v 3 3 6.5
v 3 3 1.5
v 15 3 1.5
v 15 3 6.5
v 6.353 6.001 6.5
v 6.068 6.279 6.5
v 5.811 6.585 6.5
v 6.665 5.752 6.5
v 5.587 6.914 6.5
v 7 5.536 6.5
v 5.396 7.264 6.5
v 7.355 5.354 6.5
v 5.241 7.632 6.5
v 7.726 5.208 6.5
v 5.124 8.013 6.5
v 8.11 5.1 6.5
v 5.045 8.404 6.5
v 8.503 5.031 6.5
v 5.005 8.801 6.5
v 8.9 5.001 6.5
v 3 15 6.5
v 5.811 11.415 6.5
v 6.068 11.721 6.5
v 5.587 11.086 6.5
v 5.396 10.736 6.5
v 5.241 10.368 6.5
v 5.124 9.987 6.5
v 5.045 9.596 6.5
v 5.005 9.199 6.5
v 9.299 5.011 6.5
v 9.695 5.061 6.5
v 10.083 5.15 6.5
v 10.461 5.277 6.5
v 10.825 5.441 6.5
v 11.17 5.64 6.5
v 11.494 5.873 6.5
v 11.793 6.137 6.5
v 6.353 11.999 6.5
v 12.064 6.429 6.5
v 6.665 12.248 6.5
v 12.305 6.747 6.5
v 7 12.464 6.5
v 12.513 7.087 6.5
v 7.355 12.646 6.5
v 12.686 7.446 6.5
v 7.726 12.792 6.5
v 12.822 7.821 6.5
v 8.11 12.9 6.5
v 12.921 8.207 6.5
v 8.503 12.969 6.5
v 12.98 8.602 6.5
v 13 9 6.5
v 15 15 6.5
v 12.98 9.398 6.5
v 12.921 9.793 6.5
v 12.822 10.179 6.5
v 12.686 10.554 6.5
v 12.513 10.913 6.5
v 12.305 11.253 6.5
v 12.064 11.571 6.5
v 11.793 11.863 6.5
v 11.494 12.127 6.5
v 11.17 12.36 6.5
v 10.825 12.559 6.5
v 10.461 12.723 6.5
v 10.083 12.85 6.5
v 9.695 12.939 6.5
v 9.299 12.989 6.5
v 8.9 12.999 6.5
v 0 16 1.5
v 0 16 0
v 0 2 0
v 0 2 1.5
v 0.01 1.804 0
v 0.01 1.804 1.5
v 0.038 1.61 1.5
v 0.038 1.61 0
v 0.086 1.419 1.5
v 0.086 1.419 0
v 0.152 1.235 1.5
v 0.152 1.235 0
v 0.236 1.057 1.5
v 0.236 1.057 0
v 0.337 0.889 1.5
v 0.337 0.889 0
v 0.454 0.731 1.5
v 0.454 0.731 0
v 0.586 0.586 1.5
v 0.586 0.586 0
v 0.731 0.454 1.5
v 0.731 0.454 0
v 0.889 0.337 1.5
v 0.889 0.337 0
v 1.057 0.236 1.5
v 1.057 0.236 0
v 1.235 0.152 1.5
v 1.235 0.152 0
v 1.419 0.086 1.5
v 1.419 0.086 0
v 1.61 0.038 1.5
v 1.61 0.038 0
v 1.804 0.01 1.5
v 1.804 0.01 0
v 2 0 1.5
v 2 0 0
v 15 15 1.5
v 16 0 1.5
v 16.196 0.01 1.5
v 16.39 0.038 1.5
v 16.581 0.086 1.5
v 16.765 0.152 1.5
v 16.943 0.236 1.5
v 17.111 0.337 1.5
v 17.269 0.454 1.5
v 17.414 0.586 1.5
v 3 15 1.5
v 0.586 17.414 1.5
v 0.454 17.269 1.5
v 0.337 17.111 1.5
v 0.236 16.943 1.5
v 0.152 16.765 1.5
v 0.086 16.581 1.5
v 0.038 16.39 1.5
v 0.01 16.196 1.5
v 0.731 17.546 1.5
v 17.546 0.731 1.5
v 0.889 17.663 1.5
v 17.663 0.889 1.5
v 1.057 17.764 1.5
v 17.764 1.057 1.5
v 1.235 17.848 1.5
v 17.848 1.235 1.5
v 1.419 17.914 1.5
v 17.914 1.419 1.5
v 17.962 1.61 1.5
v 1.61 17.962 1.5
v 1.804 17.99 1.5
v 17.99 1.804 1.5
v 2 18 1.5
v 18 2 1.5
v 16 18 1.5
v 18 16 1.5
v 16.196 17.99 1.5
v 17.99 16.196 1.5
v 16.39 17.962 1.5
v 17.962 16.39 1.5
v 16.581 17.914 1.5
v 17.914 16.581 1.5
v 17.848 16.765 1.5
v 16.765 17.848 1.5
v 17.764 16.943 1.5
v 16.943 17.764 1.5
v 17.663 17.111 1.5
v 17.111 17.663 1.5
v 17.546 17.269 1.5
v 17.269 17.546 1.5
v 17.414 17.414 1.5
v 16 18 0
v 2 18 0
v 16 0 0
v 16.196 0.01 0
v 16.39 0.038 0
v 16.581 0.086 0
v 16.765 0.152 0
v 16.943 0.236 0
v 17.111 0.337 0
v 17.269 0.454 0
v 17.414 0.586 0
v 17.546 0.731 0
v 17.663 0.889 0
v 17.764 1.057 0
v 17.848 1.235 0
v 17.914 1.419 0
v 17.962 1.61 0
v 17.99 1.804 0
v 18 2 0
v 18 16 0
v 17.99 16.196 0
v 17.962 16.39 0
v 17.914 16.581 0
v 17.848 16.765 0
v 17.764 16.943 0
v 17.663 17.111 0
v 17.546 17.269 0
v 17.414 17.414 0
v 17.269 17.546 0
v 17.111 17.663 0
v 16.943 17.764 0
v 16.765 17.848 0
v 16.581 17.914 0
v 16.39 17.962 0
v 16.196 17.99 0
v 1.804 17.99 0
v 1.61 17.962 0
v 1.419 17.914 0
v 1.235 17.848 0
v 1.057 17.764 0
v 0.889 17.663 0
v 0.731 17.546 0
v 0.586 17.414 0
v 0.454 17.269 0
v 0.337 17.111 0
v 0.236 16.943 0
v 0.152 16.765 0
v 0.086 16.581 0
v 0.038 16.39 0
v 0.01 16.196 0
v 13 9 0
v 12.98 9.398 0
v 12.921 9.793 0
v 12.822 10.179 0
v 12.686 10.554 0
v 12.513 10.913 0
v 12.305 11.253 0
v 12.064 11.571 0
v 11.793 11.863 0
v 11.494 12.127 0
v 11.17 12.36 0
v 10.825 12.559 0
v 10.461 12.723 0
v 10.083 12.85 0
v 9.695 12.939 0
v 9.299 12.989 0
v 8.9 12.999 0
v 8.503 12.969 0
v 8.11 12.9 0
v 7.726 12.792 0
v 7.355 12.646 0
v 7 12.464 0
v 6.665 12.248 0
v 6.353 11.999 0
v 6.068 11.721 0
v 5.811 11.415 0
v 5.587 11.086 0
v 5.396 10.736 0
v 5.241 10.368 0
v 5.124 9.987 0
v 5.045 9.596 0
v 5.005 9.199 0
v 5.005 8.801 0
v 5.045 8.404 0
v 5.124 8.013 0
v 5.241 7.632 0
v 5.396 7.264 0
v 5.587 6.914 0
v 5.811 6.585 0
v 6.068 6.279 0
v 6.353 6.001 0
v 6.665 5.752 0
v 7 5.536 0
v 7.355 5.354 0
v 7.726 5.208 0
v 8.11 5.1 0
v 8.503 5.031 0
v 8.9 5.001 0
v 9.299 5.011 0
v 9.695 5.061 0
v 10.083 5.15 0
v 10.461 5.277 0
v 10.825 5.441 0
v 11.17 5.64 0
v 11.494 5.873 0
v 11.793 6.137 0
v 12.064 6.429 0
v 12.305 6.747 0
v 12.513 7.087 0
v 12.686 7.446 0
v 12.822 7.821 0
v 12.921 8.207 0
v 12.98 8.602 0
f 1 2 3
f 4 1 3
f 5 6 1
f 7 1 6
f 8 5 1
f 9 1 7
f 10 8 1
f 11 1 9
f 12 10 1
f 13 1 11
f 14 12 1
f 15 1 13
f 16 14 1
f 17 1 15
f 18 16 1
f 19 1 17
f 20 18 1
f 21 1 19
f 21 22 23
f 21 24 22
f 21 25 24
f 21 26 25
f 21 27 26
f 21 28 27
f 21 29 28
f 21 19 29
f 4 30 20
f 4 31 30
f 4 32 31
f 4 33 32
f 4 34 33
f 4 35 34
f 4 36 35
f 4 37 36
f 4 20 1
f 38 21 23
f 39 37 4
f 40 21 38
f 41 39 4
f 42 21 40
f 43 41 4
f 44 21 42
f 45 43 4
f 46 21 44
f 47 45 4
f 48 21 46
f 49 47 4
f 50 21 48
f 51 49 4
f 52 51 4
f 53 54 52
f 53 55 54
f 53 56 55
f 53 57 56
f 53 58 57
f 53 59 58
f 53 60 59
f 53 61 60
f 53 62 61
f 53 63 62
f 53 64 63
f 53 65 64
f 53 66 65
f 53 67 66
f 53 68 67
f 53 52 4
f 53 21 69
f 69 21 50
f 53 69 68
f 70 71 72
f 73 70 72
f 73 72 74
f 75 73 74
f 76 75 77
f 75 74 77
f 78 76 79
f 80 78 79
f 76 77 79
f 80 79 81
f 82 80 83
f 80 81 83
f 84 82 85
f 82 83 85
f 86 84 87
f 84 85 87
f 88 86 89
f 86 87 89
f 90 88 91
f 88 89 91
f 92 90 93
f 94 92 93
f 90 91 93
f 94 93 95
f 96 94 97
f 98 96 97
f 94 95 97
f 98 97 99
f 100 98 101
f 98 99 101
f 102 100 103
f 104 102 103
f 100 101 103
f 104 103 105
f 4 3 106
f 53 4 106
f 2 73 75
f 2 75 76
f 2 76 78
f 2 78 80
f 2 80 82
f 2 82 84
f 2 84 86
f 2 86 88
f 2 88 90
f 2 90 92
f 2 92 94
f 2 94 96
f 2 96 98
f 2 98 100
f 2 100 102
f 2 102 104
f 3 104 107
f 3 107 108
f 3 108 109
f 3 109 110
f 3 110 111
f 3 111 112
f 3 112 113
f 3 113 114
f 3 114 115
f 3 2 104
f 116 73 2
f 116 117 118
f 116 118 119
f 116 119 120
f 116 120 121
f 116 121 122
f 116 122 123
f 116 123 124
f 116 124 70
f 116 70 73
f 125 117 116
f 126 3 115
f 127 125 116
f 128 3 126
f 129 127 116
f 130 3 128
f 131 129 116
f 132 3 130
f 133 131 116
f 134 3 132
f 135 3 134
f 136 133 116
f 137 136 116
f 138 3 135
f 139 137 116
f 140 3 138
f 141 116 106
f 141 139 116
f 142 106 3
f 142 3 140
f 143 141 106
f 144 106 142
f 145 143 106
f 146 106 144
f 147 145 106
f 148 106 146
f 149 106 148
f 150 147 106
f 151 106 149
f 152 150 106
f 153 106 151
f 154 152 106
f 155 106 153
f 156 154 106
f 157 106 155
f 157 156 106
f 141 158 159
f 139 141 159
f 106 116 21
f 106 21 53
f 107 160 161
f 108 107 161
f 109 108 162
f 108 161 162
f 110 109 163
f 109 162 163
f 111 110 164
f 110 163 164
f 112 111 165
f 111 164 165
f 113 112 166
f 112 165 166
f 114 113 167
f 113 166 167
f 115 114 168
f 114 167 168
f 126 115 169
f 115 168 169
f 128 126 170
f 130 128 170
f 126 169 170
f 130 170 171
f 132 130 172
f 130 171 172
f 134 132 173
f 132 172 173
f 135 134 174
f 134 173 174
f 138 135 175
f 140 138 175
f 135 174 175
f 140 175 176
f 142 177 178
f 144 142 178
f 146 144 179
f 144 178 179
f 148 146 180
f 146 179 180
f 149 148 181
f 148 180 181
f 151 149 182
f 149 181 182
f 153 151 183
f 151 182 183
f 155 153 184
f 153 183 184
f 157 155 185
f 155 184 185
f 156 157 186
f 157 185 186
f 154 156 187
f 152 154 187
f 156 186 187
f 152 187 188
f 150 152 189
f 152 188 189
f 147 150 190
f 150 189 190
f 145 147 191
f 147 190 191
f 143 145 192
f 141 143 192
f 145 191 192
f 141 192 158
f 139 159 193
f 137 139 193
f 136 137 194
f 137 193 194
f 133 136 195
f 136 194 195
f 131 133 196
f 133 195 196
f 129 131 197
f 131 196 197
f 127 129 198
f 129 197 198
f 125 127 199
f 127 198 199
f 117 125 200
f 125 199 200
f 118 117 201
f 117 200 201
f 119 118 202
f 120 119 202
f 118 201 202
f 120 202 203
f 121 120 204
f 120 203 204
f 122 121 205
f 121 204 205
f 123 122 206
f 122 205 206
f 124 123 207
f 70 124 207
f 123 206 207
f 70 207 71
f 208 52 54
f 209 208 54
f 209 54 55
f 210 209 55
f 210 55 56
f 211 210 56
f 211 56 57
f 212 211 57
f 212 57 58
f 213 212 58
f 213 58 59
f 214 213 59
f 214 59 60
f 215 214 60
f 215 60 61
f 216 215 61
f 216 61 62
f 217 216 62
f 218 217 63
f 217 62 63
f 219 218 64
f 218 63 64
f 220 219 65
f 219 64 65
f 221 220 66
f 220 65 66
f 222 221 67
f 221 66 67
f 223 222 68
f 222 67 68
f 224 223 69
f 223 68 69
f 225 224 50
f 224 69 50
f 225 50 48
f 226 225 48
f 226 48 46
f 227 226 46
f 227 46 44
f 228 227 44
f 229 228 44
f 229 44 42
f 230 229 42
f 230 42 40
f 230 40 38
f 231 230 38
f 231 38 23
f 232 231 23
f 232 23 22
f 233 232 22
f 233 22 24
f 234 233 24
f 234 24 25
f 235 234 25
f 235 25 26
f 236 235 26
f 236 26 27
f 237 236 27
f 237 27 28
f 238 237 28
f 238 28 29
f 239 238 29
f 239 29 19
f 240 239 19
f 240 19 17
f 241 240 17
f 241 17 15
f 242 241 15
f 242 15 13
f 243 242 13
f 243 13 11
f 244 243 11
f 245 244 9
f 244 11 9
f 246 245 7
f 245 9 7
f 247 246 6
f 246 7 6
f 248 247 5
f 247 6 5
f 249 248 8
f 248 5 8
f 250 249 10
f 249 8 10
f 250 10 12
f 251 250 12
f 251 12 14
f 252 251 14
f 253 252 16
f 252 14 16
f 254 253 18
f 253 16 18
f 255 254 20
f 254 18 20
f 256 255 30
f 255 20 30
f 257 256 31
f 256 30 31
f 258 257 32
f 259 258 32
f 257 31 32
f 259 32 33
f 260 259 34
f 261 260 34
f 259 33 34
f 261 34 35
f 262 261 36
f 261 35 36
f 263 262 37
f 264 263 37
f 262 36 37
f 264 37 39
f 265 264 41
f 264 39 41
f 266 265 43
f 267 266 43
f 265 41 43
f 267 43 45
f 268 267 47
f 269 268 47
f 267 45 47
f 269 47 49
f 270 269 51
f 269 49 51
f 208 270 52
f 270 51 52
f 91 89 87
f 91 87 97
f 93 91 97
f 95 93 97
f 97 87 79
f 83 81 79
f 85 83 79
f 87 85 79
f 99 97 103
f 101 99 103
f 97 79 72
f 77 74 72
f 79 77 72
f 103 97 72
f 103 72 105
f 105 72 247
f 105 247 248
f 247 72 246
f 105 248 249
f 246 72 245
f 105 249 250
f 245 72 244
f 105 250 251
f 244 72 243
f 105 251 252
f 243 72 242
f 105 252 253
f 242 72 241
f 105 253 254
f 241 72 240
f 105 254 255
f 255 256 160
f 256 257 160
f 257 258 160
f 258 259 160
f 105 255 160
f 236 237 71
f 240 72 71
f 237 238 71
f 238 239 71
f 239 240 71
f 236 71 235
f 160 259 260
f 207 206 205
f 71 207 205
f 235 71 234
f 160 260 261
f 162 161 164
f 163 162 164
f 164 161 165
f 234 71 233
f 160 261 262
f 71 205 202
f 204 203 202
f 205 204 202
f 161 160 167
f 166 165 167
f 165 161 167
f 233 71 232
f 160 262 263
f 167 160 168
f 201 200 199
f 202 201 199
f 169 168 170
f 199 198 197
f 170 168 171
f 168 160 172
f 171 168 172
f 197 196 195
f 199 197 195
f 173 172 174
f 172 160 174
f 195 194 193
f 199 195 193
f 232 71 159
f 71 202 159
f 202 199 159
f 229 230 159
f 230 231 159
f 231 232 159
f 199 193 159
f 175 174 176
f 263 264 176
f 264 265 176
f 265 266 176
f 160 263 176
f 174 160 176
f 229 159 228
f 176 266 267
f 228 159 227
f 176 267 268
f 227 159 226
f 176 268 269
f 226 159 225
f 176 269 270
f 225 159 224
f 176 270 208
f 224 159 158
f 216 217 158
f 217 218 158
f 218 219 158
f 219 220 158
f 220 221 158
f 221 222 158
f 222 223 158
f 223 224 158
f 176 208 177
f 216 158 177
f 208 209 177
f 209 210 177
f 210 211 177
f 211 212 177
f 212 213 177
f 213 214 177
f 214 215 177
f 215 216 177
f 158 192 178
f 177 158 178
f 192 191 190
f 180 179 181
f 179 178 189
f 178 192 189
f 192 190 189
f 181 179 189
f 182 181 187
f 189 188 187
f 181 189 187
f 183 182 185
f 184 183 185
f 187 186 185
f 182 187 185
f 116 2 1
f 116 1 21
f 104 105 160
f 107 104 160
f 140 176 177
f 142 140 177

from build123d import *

# Parameters (mm, degrees)
BOSS_EXTRUDE1_DEPTH = 1.5
SKETCH2_W           = 12
SKETCH2_H           = 12
BOSS_EXTRUDE2_DEPTH = 5
SKETCH3_R           = 4
CUT_EXTRUDE1_DEPTH  = 7.5


with BuildPart() as part:
    # Sketch1 → Boss-Extrude1 (new body)
    with BuildSketch(Plane.XY):
        with BuildLine():
            Line((2, 0), (16, 0))
            ThreePointArc((16, 0), (17.414213562, 0.585786438), (18, 2))
            Line((18, 2), (18, 16))
            ThreePointArc((18, 16), (17.414213562, 17.414213562), (16, 18))
            Line((16, 18), (2, 18))
            ThreePointArc((2, 18), (0.585786438, 17.414213562), (0, 16))
            Line((0, 16), (0, 2))
            ThreePointArc((0, 2), (0.585786438, 0.585786438), (2, 0))
        make_face()
    extrude(amount=BOSS_EXTRUDE1_DEPTH)

    # Sketch2 → Boss-Extrude2 (add)
    with BuildSketch(Plane.XY.offset(1.5)):
        with Locations((9, 9)):
            Rectangle(SKETCH2_W, SKETCH2_H)
    extrude(amount=BOSS_EXTRUDE2_DEPTH)

    # Sketch3 → Cut-Extrude1 (cut, through all)
    with BuildSketch(Plane.XY.offset(6.5)):
        with Locations((9, 9)):
            Circle(SKETCH3_R)
    extrude(amount=-CUT_EXTRUDE1_DEPTH, mode=Mode.SUBTRACT)


solid = part.part
